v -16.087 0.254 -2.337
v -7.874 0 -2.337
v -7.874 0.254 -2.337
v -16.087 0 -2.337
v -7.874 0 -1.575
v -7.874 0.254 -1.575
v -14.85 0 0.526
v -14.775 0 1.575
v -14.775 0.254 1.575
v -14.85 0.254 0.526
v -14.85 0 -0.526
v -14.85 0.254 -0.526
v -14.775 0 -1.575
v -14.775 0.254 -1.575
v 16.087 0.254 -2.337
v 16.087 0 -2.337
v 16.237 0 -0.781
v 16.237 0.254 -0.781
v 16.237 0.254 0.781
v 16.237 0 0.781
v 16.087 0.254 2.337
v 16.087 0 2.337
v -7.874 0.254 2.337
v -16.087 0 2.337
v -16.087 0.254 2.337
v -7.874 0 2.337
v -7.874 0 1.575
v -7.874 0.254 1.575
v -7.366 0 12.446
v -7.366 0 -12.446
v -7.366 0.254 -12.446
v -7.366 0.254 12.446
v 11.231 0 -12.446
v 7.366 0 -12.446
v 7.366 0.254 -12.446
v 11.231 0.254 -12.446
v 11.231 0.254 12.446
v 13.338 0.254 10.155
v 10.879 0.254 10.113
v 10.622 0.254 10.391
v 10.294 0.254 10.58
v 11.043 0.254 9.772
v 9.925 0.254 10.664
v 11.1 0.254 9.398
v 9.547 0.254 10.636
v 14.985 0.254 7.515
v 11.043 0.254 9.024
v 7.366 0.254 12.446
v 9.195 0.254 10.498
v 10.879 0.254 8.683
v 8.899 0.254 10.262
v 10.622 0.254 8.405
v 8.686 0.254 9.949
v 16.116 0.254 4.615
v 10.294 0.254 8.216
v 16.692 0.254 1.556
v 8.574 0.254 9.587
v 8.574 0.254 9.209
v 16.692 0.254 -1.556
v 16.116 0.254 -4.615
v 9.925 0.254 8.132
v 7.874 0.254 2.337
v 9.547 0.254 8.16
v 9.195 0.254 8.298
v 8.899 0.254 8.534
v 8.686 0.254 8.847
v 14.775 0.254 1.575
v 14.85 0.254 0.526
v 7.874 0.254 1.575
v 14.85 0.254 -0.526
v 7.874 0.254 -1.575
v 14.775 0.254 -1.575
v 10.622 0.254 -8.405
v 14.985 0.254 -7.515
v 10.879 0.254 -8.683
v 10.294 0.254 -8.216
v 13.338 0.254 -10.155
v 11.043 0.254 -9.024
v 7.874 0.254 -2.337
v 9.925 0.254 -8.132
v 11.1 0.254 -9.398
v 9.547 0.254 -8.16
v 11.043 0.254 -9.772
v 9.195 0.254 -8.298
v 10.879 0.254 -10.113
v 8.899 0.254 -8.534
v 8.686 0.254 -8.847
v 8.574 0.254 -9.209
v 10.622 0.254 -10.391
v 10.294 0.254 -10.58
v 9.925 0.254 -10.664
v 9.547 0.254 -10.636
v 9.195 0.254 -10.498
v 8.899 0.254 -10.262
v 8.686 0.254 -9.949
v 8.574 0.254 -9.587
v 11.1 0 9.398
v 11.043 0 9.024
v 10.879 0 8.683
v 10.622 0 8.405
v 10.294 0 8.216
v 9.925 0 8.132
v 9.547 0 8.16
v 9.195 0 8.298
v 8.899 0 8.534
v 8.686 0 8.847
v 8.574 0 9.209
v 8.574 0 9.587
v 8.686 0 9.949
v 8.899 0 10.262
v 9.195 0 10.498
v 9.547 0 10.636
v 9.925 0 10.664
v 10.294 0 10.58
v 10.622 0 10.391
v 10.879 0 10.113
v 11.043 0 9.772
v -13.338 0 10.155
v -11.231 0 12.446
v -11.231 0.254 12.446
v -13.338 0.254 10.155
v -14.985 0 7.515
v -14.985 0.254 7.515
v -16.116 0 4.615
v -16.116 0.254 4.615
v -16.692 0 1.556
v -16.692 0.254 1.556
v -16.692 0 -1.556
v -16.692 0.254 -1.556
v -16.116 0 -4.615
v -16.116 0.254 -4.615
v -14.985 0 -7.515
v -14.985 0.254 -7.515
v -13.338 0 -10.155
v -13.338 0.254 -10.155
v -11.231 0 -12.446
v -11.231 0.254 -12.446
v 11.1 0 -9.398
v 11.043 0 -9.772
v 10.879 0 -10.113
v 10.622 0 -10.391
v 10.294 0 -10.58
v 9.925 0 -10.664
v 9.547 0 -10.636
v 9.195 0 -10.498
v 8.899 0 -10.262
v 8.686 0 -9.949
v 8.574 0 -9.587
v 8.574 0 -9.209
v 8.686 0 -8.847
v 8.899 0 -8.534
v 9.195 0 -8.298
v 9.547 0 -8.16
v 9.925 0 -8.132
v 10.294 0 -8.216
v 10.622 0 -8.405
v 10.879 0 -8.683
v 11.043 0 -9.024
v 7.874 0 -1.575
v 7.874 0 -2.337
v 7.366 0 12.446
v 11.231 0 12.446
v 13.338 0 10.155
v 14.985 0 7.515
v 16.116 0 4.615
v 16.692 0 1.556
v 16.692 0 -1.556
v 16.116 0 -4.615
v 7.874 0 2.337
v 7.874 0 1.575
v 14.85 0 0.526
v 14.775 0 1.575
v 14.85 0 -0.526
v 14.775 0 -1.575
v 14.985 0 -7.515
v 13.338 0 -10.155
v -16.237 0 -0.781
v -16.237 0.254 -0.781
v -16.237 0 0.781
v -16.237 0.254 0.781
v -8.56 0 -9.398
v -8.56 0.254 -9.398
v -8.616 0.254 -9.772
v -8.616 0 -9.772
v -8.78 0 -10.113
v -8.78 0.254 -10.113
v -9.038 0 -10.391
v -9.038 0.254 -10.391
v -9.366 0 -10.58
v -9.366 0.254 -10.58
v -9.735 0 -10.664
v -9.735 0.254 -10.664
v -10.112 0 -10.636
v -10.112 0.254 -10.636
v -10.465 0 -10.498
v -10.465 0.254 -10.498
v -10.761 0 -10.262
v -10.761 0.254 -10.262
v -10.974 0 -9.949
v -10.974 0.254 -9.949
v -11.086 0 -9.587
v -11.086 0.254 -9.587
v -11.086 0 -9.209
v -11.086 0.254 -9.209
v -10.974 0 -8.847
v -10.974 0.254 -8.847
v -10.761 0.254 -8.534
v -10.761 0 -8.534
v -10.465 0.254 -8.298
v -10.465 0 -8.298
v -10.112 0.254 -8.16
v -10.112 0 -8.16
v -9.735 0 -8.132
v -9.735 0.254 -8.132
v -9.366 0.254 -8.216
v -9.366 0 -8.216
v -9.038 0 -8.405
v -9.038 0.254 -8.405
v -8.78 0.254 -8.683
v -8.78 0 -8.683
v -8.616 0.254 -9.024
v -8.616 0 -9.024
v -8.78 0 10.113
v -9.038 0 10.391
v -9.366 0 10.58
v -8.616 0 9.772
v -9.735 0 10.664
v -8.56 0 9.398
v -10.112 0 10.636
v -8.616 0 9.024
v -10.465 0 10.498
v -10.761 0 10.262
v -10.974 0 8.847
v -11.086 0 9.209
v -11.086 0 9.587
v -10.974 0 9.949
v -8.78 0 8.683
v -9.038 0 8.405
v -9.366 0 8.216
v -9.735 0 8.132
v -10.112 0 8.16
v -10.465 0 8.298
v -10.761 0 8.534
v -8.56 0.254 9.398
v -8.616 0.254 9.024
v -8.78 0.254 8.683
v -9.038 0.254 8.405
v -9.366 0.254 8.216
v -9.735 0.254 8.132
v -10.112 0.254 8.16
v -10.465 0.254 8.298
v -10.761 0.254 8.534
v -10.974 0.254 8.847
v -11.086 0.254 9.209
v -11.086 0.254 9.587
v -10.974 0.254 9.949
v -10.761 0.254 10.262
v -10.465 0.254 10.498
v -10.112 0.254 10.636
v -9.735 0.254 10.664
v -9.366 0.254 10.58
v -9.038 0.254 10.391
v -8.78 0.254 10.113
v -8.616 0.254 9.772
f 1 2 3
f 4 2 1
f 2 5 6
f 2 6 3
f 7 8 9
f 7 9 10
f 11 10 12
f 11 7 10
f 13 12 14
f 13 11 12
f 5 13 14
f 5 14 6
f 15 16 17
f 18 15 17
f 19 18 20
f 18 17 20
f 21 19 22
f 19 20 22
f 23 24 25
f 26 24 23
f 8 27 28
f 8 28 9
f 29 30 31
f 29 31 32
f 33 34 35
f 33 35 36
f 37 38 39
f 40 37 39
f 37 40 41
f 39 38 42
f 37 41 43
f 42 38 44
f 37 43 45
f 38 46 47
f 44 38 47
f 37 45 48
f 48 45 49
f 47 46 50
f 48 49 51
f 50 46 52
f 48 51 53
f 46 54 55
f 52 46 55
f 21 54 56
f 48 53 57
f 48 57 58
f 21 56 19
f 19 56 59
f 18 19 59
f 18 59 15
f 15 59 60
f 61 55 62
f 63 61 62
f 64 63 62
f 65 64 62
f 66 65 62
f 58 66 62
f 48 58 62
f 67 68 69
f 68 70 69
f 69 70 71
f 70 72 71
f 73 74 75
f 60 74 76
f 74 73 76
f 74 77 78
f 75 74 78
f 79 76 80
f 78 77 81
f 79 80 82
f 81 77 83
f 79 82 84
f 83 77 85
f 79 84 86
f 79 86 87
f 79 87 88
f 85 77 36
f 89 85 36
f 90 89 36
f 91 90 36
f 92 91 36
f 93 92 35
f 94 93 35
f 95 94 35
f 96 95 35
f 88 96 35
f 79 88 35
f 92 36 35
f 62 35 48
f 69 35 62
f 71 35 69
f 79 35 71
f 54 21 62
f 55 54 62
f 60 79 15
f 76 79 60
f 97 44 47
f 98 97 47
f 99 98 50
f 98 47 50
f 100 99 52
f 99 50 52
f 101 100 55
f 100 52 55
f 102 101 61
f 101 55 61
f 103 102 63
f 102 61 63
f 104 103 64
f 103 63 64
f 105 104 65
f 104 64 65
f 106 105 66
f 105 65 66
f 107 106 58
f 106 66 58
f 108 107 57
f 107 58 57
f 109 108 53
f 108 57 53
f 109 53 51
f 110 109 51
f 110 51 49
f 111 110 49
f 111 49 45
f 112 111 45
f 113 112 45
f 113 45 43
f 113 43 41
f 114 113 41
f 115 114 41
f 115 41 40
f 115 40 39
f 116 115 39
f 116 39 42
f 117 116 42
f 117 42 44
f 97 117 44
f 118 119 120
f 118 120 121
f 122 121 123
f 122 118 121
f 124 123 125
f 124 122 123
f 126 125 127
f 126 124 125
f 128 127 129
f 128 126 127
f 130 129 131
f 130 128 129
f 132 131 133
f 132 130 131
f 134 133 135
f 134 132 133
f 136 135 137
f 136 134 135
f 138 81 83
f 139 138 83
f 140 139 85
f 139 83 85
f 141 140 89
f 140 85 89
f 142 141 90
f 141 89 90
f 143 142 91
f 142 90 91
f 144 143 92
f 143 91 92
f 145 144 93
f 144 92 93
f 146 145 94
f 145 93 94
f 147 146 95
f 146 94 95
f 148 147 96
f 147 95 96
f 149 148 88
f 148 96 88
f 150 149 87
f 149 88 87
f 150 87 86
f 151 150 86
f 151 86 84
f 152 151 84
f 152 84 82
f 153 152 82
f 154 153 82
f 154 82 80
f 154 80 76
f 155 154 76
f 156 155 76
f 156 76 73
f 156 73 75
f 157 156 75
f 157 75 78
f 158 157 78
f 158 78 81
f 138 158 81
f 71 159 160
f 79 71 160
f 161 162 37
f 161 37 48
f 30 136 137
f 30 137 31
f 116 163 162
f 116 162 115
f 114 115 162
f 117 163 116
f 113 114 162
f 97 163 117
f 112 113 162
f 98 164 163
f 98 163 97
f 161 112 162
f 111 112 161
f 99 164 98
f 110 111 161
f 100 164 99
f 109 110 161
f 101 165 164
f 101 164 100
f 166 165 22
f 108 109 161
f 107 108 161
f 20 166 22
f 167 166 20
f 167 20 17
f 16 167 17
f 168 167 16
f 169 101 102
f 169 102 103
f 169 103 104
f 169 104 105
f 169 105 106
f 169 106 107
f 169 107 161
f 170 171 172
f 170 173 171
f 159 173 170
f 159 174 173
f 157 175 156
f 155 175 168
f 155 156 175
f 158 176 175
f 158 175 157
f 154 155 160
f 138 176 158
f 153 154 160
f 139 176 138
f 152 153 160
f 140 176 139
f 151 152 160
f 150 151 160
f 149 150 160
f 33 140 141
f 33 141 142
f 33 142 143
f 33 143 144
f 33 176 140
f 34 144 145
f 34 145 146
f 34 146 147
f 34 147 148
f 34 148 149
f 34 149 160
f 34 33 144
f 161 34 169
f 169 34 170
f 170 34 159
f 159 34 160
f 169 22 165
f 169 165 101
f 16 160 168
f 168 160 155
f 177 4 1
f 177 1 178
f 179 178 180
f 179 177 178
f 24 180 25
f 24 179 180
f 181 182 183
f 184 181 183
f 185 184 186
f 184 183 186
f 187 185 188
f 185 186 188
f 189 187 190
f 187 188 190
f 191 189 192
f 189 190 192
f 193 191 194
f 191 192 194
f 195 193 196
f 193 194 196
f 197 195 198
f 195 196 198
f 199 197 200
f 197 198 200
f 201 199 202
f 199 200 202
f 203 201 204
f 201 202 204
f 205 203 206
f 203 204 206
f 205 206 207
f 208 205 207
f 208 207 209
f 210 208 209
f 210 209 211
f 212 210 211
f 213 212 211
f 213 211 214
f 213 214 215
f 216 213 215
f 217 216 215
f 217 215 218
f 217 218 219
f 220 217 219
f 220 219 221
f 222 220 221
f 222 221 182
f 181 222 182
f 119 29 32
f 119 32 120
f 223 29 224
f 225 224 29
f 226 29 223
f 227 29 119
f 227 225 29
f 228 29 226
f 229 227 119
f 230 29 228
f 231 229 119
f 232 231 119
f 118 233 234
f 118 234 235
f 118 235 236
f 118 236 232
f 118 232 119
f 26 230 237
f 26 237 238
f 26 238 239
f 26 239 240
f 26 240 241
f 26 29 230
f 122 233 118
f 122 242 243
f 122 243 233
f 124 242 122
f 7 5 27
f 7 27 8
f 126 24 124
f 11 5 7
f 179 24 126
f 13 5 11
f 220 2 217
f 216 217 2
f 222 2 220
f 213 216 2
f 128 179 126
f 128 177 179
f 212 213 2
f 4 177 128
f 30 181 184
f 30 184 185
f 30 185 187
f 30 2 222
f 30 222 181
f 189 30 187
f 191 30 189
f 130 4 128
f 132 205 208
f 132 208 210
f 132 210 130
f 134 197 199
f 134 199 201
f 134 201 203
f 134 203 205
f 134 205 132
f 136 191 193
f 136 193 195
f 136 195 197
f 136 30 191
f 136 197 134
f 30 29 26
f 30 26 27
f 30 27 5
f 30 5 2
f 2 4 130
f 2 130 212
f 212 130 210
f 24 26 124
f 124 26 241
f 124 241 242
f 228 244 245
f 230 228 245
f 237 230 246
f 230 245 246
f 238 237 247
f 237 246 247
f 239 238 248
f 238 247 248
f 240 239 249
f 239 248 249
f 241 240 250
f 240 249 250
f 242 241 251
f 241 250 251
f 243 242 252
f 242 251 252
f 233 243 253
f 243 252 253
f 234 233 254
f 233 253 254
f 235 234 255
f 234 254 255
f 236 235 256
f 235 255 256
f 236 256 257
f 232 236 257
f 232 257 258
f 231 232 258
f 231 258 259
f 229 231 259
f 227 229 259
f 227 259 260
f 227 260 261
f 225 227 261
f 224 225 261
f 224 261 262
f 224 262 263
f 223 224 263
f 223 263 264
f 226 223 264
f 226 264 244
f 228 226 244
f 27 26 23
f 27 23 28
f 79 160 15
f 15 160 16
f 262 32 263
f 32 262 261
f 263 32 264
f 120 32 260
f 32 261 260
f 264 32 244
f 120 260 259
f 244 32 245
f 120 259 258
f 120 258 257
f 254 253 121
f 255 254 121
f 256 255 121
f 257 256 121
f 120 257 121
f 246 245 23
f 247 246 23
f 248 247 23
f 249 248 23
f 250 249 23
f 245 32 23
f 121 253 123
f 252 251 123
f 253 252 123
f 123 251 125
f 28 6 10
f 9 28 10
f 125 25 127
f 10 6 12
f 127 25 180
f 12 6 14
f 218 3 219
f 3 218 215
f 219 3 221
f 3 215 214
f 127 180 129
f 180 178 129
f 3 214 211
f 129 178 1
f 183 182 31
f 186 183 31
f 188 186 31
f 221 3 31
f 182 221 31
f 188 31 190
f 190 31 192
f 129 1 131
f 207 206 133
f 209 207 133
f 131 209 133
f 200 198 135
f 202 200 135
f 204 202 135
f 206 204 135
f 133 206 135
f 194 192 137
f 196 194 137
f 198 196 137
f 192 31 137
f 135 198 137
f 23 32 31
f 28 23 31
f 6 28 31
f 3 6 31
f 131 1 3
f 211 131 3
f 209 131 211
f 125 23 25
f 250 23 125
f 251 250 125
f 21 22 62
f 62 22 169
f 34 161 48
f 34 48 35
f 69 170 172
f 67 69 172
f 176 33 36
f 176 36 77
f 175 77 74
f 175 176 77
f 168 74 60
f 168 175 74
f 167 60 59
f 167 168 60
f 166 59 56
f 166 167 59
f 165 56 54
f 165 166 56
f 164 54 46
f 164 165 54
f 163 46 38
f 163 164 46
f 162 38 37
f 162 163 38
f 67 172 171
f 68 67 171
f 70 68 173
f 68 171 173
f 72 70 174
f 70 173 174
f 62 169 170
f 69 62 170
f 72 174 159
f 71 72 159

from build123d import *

# Parameters (mm, degrees)
BOSS_EXTRUDE1_DEPTH   = 0.254
BOSS_EXTRUDE1_2_DEPTH = 0.254
SKETCH2_R             = 1.27
CUT_EXTRUDE1_DEPTH    = 1.254


with BuildPart() as part:
    # Sketch1 → Boss-Extrude1 (new body)
    with BuildSketch(Plane(origin=(0, 0, 0), x_dir=(1, 0, 0), z_dir=(0, 1, 0))):
        with BuildLine():
            Line((11.230707012, -12.446), (7.366, -12.446))
            Line((7.366, -12.446), (7.366, 12.446))
            Line((7.366, 12.446), (11.230707012, 12.446))
            ThreePointArc((11.230707012, 12.446), (16.764, 0), (11.230707012, -12.446))
        make_face()
        with BuildLine():
            Line((7.874, -1.5748), (14.775313396, -1.5748))
            ThreePointArc((14.775313396, -1.5748), (14.859, 0), (14.775313396, 1.5748))
            Line((14.775313396, 1.5748), (7.874, 1.5748))
            Line((7.874, 1.5748), (7.874, 2.3368))
            Line((7.874, 2.3368), (16.087165747, 2.3368))
            ThreePointArc((16.087165747, 2.3368), (16.256, 0), (16.087165747, -2.3368))
            Line((16.087165747, -2.3368), (7.874, -2.3368))
            Line((7.874, -2.3368), (7.874, -1.5748))
        make_face(mode=Mode.SUBTRACT)
    extrude(amount=BOSS_EXTRUDE1_DEPTH)


with BuildPart() as body_2:
    # Sketch1 → Boss-Extrude1 2 (new body)
    with BuildSketch(Plane(origin=(0, 0, 0), x_dir=(1, 0, 0), z_dir=(0, 1, 0))):
        with BuildLine():
            Line((-11.230707012, 12.446), (-7.366, 12.446))
            Line((-7.366, 12.446), (-7.366, -12.446))
            Line((-7.366, -12.446), (-11.230707012, -12.446))
            ThreePointArc((-11.230707012, -12.446), (-16.764, 0), (-11.230707012, 12.446))
        make_face()
        with BuildLine():
            ThreePointArc((-14.775313396, -1.5748), (-14.859, 0), (-14.775313396, 1.5748))
            Line((-14.775313396, 1.5748), (-7.874, 1.5748))
            Line((-7.874, 1.5748), (-7.874, 2.3368))
            Line((-7.874, 2.3368), (-16.087165747, 2.3368))
            ThreePointArc((-16.087165747, 2.3368), (-16.256, 0), (-16.087165747, -2.3368))
            Line((-16.087165747, -2.3368), (-7.874, -2.3368))
            Line((-7.874, -2.3368), (-7.874, -1.5748))
            Line((-7.874, -1.5748), (-14.775313396, -1.5748))
        make_face(mode=Mode.SUBTRACT)
    extrude(amount=BOSS_EXTRUDE1_2_DEPTH)


with BuildPart() as cut_extrude1_tool:
    # Sketch2 → Cut-Extrude1 (new body, through all)
    with BuildSketch(Plane(origin=(0, 0.254, 0), x_dir=(1, 0, 0), z_dir=(0, 1, 0))):
        with Locations((9.8298, -9.398)):
            Circle(SKETCH2_R)
        with Locations((9.8298, 9.398)):
            Circle(SKETCH2_R)
        with Locations((-9.8298, -9.398)):
            Circle(SKETCH2_R)
        with Locations((-9.8298, 9.398)):
            Circle(SKETCH2_R)
    extrude(amount=-CUT_EXTRUDE1_DEPTH)


with BuildPart() as part_1:
    add(part.part)

    # Cut-Extrude1: cut by cut_extrude1_tool
    add(cut_extrude1_tool.part, mode=Mode.SUBTRACT)


with BuildPart() as body_2_1:
    add(body_2.part)

    # Cut-Extrude1: cut by cut_extrude1_tool
    add(cut_extrude1_tool.part, mode=Mode.SUBTRACT)


solid = Compound([part_1.part, body_2_1.part])
